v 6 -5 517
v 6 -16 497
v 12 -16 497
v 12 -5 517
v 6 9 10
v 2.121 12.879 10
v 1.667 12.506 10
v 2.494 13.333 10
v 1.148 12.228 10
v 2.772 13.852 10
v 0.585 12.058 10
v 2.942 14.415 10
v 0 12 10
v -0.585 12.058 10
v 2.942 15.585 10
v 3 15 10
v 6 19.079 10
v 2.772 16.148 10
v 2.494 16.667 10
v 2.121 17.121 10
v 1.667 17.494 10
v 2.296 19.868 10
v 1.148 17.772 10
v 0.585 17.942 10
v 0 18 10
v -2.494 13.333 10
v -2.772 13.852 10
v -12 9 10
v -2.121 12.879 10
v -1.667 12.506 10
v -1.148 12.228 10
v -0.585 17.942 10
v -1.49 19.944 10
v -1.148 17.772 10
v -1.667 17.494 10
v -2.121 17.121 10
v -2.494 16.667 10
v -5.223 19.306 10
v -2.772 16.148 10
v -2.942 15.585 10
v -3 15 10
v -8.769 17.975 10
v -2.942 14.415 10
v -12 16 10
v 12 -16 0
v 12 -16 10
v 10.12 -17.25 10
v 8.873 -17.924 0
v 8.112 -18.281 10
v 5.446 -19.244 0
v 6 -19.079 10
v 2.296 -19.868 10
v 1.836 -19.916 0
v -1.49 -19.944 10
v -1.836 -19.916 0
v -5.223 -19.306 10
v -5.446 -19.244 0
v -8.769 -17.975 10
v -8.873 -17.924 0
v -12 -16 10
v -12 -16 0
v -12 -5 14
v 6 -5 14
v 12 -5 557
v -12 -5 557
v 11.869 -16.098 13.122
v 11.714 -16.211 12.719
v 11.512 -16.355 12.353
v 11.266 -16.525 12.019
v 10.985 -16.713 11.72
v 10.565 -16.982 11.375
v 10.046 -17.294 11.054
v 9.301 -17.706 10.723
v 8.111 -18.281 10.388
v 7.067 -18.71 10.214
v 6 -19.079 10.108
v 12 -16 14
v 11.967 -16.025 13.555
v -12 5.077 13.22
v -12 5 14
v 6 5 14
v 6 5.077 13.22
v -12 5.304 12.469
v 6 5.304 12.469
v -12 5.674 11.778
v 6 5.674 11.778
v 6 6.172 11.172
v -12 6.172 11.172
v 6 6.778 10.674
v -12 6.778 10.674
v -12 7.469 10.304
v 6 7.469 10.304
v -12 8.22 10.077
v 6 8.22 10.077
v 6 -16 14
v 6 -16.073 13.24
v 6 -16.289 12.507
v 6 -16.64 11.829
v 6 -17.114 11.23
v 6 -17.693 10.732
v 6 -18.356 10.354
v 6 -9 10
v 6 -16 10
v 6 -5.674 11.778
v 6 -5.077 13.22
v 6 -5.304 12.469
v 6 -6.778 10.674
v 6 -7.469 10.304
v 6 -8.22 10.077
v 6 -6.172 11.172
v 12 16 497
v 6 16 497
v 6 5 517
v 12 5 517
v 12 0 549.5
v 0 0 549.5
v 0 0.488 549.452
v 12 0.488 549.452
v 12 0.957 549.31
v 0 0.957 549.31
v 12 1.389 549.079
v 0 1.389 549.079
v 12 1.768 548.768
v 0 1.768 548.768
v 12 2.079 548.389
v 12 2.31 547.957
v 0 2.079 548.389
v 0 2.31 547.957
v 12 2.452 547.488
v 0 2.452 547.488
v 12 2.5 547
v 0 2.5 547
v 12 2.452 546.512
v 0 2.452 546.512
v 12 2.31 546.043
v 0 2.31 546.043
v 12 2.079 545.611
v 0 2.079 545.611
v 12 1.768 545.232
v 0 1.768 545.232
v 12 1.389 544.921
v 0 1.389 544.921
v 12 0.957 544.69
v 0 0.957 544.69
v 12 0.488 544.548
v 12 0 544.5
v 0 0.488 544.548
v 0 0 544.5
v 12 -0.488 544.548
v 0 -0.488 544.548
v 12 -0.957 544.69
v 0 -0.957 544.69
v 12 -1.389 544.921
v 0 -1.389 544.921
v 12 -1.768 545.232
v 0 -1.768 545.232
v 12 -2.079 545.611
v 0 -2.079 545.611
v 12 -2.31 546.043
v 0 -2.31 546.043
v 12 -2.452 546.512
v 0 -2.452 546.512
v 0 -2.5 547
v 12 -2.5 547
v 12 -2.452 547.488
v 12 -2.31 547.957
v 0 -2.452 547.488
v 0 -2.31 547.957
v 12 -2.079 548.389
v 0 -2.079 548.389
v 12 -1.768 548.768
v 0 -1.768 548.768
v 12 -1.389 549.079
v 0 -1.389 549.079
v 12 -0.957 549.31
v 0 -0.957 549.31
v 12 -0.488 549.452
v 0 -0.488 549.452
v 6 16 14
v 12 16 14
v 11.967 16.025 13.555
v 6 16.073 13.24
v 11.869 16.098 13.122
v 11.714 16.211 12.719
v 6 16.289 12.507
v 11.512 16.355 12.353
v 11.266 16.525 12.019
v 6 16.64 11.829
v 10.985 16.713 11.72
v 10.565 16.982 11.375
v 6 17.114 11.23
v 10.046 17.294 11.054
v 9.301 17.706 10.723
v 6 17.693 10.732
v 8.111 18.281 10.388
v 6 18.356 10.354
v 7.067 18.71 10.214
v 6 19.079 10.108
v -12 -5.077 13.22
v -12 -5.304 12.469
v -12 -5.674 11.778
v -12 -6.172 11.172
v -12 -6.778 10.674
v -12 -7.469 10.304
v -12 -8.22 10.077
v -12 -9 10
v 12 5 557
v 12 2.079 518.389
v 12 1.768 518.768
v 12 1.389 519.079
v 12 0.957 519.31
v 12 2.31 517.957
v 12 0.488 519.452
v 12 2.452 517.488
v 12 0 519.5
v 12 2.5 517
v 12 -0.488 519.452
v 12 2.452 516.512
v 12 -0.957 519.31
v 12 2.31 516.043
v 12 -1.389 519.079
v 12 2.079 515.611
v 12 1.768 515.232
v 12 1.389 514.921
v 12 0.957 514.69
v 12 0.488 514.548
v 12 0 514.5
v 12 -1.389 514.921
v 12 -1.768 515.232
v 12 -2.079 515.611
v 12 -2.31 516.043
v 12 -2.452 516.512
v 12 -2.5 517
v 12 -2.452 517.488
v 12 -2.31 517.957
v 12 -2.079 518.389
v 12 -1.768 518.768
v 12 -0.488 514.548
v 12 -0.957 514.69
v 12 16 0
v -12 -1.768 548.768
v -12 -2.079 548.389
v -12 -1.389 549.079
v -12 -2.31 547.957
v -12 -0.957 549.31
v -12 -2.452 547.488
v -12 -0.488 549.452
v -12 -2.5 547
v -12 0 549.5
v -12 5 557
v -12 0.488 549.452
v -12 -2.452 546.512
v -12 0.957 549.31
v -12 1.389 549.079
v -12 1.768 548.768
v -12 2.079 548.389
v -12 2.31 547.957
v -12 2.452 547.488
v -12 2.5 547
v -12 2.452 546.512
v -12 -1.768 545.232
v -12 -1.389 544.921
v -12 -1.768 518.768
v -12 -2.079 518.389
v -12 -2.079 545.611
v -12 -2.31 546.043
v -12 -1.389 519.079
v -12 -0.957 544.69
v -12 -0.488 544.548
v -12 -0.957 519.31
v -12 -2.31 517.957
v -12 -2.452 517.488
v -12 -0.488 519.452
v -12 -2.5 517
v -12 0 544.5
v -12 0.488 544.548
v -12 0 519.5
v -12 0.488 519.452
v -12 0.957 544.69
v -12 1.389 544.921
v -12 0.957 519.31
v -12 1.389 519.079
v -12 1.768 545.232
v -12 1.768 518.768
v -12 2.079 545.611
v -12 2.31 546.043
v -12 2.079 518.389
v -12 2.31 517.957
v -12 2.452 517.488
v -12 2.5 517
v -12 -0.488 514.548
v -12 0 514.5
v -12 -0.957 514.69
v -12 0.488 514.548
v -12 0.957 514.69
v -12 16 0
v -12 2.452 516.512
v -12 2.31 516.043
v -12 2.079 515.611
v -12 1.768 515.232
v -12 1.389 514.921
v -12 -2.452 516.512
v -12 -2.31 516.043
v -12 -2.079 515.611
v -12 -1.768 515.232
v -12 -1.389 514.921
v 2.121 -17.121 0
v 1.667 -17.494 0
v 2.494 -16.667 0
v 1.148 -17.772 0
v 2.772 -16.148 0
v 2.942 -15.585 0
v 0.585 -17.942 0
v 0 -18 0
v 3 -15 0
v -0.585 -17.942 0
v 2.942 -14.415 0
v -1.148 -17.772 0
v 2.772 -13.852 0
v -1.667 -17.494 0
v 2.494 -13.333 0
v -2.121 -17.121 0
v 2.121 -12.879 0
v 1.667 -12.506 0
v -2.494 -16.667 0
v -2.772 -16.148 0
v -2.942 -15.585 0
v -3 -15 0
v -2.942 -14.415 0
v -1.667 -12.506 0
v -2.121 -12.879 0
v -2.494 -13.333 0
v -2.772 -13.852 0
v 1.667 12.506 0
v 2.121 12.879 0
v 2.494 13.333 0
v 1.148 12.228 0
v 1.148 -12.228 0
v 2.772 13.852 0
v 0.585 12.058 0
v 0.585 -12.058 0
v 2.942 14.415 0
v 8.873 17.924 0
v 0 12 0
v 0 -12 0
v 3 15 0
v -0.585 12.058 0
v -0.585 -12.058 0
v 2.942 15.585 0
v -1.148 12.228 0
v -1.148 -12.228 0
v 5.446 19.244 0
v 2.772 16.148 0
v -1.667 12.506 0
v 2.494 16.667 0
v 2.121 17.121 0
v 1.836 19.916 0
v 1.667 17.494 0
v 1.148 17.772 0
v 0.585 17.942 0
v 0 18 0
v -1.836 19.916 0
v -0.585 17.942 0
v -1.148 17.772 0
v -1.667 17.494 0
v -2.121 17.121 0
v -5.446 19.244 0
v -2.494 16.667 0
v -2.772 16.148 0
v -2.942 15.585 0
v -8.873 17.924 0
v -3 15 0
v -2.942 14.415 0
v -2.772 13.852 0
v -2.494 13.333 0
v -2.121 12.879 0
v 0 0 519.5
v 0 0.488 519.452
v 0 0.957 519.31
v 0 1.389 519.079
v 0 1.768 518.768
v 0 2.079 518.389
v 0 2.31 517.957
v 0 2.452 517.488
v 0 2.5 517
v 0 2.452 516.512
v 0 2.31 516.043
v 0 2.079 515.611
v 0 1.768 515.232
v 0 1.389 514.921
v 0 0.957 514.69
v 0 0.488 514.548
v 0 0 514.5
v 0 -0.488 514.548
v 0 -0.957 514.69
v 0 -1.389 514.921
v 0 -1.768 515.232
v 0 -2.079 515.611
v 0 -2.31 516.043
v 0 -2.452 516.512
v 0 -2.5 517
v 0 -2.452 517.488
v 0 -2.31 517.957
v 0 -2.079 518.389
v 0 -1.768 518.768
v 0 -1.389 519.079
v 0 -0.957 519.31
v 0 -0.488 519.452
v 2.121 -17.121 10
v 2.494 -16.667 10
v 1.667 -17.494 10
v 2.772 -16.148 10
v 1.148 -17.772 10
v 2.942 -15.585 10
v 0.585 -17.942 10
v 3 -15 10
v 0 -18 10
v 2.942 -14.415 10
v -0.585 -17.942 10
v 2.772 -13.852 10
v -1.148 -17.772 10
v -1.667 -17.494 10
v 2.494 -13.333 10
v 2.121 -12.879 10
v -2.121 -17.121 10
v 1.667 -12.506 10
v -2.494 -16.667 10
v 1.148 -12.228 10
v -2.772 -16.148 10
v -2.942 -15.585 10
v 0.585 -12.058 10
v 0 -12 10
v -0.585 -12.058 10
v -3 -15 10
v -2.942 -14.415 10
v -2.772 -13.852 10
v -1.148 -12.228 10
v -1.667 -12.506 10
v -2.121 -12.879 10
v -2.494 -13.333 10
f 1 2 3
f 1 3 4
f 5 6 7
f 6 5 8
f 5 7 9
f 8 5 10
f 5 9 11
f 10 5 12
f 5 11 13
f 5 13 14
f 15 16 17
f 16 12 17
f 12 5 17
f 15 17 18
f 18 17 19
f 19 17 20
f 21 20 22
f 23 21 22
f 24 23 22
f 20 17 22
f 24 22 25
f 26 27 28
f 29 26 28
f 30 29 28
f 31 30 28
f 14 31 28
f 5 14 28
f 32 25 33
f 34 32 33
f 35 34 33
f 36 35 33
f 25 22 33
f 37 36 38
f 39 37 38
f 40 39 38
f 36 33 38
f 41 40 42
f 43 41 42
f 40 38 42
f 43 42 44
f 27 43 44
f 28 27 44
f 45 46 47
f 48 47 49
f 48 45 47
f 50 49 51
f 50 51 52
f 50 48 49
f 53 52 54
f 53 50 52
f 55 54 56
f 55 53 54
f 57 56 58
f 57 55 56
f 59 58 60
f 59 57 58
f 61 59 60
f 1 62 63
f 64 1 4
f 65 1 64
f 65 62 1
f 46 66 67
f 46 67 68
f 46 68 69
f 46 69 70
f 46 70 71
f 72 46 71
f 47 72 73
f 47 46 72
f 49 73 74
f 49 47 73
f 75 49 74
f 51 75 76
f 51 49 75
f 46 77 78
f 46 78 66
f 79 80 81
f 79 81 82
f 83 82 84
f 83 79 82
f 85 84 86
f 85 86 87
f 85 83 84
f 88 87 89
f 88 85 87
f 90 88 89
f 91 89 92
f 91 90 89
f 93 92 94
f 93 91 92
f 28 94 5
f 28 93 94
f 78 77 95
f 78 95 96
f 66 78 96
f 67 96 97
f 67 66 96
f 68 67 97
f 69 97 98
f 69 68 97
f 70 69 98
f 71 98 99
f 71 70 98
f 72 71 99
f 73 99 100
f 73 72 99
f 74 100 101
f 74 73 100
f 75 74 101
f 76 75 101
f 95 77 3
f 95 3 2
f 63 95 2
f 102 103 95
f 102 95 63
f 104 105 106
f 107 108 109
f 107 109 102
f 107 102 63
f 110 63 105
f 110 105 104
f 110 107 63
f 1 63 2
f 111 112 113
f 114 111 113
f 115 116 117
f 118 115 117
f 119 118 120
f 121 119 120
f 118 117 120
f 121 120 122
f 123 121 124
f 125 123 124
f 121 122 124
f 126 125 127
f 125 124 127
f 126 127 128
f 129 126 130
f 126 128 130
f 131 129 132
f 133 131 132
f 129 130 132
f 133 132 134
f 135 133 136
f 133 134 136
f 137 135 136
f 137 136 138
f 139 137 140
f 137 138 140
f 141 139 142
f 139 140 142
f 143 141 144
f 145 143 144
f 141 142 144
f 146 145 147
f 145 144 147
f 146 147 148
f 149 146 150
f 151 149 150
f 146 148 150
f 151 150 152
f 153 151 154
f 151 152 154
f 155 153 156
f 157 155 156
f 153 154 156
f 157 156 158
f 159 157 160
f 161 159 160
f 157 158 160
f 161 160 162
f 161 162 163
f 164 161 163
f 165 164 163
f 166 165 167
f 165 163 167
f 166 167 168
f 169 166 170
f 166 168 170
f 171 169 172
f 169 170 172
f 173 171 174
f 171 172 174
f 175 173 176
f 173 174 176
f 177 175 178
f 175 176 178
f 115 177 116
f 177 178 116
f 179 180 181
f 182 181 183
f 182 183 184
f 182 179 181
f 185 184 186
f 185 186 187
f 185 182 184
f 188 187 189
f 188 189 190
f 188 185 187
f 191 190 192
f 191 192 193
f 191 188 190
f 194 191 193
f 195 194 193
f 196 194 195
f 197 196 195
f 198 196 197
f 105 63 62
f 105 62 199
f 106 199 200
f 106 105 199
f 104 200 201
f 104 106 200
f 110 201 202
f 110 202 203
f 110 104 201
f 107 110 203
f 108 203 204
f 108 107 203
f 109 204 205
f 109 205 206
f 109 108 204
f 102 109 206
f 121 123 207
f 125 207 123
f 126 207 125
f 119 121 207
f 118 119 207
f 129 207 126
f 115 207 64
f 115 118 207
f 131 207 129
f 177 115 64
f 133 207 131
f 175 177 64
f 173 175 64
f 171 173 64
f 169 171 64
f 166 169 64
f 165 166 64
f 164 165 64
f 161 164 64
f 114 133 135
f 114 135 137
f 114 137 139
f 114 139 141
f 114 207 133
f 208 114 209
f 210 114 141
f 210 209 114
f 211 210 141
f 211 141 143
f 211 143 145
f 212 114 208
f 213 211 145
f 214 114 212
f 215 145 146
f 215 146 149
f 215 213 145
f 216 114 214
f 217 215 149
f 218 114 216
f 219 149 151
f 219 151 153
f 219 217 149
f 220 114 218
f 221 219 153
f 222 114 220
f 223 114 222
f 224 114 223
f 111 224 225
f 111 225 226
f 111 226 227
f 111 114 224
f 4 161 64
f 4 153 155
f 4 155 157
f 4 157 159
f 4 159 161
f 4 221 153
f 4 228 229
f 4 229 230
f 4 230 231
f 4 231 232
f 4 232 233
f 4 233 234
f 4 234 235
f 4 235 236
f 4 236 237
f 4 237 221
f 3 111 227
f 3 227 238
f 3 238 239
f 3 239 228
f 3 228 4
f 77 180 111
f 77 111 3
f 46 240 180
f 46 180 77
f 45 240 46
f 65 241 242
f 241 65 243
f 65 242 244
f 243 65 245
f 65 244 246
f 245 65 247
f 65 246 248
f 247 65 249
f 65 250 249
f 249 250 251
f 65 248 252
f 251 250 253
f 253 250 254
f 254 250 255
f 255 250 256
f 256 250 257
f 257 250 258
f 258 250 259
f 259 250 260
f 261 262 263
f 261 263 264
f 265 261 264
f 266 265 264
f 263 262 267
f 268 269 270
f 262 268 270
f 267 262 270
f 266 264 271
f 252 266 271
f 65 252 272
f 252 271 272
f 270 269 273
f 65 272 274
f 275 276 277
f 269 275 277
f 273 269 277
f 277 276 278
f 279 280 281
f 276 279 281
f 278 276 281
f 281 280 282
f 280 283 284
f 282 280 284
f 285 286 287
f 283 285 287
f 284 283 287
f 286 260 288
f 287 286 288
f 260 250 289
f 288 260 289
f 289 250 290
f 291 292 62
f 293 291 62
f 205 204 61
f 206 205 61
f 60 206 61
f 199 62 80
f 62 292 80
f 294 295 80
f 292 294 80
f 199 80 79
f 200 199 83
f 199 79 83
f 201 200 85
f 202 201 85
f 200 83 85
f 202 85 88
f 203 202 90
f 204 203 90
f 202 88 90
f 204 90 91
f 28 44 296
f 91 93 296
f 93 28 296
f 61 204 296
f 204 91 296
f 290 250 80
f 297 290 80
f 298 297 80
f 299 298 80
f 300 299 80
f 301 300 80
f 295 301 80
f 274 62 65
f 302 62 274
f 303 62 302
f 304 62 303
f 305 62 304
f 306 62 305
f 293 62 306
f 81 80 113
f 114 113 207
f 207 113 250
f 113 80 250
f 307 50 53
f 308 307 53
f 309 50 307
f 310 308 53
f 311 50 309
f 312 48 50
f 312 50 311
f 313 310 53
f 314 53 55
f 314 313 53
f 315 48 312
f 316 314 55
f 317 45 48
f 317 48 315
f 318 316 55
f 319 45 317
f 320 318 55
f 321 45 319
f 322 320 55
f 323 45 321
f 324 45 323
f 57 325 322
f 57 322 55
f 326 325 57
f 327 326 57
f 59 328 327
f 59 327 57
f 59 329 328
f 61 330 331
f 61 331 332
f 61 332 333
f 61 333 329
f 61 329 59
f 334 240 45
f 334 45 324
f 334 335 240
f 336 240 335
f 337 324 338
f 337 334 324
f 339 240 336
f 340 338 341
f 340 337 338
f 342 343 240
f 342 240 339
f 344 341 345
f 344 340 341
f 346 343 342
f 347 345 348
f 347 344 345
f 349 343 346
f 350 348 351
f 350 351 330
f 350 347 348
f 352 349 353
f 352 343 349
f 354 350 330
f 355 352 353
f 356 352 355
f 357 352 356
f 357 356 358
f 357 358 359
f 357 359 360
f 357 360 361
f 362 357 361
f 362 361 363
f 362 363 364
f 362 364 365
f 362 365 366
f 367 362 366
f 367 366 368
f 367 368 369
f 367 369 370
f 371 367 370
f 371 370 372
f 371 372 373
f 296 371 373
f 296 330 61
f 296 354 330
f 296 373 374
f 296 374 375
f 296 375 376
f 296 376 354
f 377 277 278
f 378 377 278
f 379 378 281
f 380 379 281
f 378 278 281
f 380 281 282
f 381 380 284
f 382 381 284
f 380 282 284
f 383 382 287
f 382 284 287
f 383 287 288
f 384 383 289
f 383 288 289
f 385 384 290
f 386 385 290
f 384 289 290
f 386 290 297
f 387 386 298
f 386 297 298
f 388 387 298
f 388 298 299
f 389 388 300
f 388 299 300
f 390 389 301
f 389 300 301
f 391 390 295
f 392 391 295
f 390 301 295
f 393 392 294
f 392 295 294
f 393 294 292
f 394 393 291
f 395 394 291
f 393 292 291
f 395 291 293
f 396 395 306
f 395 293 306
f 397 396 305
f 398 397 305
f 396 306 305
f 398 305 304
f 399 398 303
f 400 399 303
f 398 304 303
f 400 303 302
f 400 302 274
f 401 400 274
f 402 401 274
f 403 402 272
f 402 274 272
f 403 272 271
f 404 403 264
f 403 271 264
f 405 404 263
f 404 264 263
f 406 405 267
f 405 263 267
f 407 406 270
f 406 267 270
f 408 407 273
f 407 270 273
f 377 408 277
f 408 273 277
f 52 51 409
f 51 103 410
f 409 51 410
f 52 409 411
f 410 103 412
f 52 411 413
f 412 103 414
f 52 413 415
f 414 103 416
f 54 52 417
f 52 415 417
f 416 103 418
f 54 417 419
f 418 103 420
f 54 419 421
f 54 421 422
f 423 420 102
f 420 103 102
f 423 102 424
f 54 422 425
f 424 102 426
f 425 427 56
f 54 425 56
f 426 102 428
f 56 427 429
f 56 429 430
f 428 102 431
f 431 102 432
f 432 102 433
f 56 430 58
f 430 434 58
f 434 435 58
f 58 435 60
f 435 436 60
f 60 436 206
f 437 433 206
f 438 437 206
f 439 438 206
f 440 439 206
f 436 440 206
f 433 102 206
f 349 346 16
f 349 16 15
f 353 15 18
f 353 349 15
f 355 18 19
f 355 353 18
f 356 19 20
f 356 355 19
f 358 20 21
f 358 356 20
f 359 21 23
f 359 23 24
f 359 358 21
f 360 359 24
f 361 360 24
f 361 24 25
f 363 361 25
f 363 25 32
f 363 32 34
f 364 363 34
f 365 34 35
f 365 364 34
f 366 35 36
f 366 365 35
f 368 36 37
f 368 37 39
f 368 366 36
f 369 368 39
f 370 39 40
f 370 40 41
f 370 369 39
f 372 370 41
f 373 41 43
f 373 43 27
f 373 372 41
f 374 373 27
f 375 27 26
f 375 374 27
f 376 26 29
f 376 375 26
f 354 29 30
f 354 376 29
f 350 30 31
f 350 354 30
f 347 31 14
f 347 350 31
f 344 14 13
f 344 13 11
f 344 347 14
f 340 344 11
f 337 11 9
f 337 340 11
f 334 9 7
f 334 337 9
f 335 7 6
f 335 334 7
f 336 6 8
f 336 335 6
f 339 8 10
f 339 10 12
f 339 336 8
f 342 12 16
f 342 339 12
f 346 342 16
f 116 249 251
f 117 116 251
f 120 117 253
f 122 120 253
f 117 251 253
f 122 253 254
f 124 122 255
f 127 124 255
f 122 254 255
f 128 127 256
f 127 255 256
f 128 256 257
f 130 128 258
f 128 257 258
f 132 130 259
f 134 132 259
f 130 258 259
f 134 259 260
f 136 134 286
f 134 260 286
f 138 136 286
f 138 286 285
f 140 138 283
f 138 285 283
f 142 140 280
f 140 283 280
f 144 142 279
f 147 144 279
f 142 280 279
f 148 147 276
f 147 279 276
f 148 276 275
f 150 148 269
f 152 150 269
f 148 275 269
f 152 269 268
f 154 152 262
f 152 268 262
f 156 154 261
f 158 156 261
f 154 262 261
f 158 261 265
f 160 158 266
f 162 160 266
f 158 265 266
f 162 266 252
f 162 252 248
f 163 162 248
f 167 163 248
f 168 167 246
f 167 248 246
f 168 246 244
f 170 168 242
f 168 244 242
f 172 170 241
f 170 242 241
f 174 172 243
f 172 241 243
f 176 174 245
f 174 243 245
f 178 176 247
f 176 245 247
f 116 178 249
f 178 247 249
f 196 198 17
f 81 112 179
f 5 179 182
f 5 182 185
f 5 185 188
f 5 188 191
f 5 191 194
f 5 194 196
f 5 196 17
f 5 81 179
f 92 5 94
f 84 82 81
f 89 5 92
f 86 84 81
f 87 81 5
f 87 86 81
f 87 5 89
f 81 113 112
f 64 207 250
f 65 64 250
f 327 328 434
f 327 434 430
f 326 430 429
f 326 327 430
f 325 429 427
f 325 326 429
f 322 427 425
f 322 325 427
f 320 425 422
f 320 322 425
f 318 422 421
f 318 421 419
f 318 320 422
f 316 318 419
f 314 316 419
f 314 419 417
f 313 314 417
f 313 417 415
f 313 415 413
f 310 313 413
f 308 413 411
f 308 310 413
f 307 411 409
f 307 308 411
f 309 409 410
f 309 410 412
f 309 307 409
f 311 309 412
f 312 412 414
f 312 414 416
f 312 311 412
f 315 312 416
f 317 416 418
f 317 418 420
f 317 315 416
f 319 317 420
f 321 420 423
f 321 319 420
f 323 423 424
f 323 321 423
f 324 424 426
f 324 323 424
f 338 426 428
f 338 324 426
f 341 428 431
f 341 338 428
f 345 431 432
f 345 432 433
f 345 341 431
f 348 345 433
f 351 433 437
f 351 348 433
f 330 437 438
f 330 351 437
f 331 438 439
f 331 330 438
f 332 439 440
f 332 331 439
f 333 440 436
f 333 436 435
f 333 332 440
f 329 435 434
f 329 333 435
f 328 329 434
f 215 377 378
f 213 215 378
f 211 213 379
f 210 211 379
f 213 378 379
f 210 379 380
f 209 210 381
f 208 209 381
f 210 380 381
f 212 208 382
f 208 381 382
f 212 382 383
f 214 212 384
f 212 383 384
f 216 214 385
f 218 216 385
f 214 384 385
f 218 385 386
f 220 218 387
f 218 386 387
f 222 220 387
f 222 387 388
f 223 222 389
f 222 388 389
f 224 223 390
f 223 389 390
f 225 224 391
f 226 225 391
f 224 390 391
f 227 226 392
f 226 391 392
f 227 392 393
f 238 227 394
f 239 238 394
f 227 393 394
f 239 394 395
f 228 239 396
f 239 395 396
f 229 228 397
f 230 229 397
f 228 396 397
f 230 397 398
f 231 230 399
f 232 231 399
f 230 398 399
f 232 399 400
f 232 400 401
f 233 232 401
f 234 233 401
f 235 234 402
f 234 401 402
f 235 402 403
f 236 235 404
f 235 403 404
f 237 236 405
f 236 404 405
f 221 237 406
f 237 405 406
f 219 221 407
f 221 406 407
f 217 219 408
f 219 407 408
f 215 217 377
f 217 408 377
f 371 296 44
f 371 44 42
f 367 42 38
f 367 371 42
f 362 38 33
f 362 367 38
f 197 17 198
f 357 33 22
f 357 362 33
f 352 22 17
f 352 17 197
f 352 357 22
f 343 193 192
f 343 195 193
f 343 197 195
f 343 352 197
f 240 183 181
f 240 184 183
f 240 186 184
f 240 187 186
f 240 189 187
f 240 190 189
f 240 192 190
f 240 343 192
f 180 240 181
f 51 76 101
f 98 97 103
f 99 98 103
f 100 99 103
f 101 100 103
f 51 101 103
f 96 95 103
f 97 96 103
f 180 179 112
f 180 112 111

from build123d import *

# Parameters (mm, degrees)
ESQUISSE1_R             = 3
BOSS_EXTRU_1_DEPTH      = 10
BOSS_EXTRU_2_DEPTH      = 547
ENL_V_MAT_EXTRU_1_DEPTH = 558.649531516
CONG_1_R                = 4
ESQUISSE4_R             = 2.5
ENL_V_MAT_EXTRU_2_DEPTH = 12
ENL_V_START             = -12
ESQUISSE4_2_R           = 2.5
ENL_V_MAT_EXTRU_3_DEPTH = 12


with BuildPart() as part:
    # Esquisse1 → Boss.-Extru.1 (new body)
    with BuildSketch(Plane.XY):
        with BuildLine():
            Line((12, 16), (12, -16))
            ThreePointArc((12, -16), (0, -20), (-12, -16))
            Line((-12, -16), (-12, 16))
            ThreePointArc((-12, 16), (0, 20), (12, 16))
        make_face()
        with Locations((0, 15)):
            Circle(ESQUISSE1_R, mode=Mode.SUBTRACT)
        with Locations(Location((0, -15, 0), (0, 0, 180))):
            Circle(ESQUISSE1_R, mode=Mode.SUBTRACT)
    extrude(amount=BOSS_EXTRU_1_DEPTH)

    # Esquisse2 → Boss.-Extru.2 (add)
    with BuildSketch(Plane.XY.offset(10)):
        Polygon((12, 16), (12, -16), (6, -16), (6, -5), (-12, -5), (-12, 5), (6, 5), (6, 16), align=None)
    extrude(amount=BOSS_EXTRU_2_DEPTH)

    # Esquisse3 → Enlèv. mat.-Extru.1 (cut, through all)
    with BuildSketch(Plane.ZY.offset(-6)):
        Polygon((557, 5), (557, 16), (497, 16), (517, 5), align=None)
        Polygon((557, -5), (557, -16), (497, -16), (517, -5), align=None)
    extrude(amount=-ENL_V_MAT_EXTRU_1_DEPTH, mode=Mode.SUBTRACT)

    # Congé1
    # the kernel refuses this fillet: 4 mm, written as the material it adds along each edge
    with BuildSketch(Plane(origin=(6, 16, 10), x_dir=(0, 0, 1), z_dir=(1, 0, 0))) as cong_1_piece_1_section:
        with BuildLine():
            CenterArc((CONG_1_R, -CONG_1_R), CONG_1_R, 90, 90)
            Line((0, -CONG_1_R), (0, 0))
            Line((0, 0), (CONG_1_R, 0))
        make_face()
    cong_1_piece_1 = extrude(amount=16, mode=Mode.PRIVATE)
    cong_1_piece_1 = cong_1_piece_1 & Plane(origin=(0, 0, 11.015044396), x_dir=(-0.6000000000000009, 0.7999999999999994, 0), z_dir=(0, 0, -1)) * Cylinder(20, 48, mode=Mode.PRIVATE)
    add(cong_1_piece_1)
    with BuildSketch(Plane(origin=(-12, 5, 10), x_dir=(0, 1, 0), z_dir=(1, 0, 0))) as cong_1_piece_2:
        with BuildLine():
            CenterArc((CONG_1_R, CONG_1_R), CONG_1_R, 180, 90)
            Line((0, CONG_1_R), (0, 0))
            Line((0, 0), (CONG_1_R, 0))
        make_face()
    extrude(amount=18)
    with BuildSketch(Plane(origin=(6, -5, 10), x_dir=(0, 0, 1), z_dir=(-1, 0, 0))) as cong_1_piece_3:
        with BuildLine():
            CenterArc((CONG_1_R, -CONG_1_R), CONG_1_R, 90, 90)
            Line((0, -CONG_1_R), (0, 0))
            Line((0, 0), (CONG_1_R, 0))
        make_face()
    extrude(amount=18)
    with BuildSketch(Plane(origin=(22, -16, 10), x_dir=(0, 0, 1), z_dir=(-1, 0, 0))) as cong_1_piece_4_section:
        with BuildLine():
            CenterArc((CONG_1_R, -CONG_1_R), CONG_1_R, 90, 90)
            Line((0, -CONG_1_R), (0, 0))
            Line((0, 0), (CONG_1_R, 0))
        make_face()
    cong_1_piece_4 = extrude(amount=16, mode=Mode.PRIVATE)
    cong_1_piece_4 = cong_1_piece_4 & Plane(origin=(0, 0, 11.015045295), x_dir=(0.5999999999999954, -0.8000000000000034, 0), z_dir=(0, 0, -1)) * Cylinder(20, 48, mode=Mode.PRIVATE)
    add(cong_1_piece_4)

    # Esquisse4 → Enlèv. mat.-Extru.2 (cut)
    with BuildSketch(Plane.ZY.offset(12)):
        with Locations((547, 0)):
            Circle(ESQUISSE4_R)
        with Locations((517, 0)):
            Circle(ESQUISSE4_R)
    extrude(amount=-ENL_V_MAT_EXTRU_2_DEPTH, mode=Mode.SUBTRACT)

    # Esquisse4<2> → Enlèv. mat.-Extru.3 (cut)
    with BuildSketch(Plane.ZY.offset(12).offset(ENL_V_START)):
        with Locations((547, 0)):
            Circle(ESQUISSE4_2_R)
        with Locations((517, 0)):
            Circle(ESQUISSE4_2_R)
    extrude(amount=-ENL_V_MAT_EXTRU_3_DEPTH, mode=Mode.SUBTRACT)


solid = part.part
